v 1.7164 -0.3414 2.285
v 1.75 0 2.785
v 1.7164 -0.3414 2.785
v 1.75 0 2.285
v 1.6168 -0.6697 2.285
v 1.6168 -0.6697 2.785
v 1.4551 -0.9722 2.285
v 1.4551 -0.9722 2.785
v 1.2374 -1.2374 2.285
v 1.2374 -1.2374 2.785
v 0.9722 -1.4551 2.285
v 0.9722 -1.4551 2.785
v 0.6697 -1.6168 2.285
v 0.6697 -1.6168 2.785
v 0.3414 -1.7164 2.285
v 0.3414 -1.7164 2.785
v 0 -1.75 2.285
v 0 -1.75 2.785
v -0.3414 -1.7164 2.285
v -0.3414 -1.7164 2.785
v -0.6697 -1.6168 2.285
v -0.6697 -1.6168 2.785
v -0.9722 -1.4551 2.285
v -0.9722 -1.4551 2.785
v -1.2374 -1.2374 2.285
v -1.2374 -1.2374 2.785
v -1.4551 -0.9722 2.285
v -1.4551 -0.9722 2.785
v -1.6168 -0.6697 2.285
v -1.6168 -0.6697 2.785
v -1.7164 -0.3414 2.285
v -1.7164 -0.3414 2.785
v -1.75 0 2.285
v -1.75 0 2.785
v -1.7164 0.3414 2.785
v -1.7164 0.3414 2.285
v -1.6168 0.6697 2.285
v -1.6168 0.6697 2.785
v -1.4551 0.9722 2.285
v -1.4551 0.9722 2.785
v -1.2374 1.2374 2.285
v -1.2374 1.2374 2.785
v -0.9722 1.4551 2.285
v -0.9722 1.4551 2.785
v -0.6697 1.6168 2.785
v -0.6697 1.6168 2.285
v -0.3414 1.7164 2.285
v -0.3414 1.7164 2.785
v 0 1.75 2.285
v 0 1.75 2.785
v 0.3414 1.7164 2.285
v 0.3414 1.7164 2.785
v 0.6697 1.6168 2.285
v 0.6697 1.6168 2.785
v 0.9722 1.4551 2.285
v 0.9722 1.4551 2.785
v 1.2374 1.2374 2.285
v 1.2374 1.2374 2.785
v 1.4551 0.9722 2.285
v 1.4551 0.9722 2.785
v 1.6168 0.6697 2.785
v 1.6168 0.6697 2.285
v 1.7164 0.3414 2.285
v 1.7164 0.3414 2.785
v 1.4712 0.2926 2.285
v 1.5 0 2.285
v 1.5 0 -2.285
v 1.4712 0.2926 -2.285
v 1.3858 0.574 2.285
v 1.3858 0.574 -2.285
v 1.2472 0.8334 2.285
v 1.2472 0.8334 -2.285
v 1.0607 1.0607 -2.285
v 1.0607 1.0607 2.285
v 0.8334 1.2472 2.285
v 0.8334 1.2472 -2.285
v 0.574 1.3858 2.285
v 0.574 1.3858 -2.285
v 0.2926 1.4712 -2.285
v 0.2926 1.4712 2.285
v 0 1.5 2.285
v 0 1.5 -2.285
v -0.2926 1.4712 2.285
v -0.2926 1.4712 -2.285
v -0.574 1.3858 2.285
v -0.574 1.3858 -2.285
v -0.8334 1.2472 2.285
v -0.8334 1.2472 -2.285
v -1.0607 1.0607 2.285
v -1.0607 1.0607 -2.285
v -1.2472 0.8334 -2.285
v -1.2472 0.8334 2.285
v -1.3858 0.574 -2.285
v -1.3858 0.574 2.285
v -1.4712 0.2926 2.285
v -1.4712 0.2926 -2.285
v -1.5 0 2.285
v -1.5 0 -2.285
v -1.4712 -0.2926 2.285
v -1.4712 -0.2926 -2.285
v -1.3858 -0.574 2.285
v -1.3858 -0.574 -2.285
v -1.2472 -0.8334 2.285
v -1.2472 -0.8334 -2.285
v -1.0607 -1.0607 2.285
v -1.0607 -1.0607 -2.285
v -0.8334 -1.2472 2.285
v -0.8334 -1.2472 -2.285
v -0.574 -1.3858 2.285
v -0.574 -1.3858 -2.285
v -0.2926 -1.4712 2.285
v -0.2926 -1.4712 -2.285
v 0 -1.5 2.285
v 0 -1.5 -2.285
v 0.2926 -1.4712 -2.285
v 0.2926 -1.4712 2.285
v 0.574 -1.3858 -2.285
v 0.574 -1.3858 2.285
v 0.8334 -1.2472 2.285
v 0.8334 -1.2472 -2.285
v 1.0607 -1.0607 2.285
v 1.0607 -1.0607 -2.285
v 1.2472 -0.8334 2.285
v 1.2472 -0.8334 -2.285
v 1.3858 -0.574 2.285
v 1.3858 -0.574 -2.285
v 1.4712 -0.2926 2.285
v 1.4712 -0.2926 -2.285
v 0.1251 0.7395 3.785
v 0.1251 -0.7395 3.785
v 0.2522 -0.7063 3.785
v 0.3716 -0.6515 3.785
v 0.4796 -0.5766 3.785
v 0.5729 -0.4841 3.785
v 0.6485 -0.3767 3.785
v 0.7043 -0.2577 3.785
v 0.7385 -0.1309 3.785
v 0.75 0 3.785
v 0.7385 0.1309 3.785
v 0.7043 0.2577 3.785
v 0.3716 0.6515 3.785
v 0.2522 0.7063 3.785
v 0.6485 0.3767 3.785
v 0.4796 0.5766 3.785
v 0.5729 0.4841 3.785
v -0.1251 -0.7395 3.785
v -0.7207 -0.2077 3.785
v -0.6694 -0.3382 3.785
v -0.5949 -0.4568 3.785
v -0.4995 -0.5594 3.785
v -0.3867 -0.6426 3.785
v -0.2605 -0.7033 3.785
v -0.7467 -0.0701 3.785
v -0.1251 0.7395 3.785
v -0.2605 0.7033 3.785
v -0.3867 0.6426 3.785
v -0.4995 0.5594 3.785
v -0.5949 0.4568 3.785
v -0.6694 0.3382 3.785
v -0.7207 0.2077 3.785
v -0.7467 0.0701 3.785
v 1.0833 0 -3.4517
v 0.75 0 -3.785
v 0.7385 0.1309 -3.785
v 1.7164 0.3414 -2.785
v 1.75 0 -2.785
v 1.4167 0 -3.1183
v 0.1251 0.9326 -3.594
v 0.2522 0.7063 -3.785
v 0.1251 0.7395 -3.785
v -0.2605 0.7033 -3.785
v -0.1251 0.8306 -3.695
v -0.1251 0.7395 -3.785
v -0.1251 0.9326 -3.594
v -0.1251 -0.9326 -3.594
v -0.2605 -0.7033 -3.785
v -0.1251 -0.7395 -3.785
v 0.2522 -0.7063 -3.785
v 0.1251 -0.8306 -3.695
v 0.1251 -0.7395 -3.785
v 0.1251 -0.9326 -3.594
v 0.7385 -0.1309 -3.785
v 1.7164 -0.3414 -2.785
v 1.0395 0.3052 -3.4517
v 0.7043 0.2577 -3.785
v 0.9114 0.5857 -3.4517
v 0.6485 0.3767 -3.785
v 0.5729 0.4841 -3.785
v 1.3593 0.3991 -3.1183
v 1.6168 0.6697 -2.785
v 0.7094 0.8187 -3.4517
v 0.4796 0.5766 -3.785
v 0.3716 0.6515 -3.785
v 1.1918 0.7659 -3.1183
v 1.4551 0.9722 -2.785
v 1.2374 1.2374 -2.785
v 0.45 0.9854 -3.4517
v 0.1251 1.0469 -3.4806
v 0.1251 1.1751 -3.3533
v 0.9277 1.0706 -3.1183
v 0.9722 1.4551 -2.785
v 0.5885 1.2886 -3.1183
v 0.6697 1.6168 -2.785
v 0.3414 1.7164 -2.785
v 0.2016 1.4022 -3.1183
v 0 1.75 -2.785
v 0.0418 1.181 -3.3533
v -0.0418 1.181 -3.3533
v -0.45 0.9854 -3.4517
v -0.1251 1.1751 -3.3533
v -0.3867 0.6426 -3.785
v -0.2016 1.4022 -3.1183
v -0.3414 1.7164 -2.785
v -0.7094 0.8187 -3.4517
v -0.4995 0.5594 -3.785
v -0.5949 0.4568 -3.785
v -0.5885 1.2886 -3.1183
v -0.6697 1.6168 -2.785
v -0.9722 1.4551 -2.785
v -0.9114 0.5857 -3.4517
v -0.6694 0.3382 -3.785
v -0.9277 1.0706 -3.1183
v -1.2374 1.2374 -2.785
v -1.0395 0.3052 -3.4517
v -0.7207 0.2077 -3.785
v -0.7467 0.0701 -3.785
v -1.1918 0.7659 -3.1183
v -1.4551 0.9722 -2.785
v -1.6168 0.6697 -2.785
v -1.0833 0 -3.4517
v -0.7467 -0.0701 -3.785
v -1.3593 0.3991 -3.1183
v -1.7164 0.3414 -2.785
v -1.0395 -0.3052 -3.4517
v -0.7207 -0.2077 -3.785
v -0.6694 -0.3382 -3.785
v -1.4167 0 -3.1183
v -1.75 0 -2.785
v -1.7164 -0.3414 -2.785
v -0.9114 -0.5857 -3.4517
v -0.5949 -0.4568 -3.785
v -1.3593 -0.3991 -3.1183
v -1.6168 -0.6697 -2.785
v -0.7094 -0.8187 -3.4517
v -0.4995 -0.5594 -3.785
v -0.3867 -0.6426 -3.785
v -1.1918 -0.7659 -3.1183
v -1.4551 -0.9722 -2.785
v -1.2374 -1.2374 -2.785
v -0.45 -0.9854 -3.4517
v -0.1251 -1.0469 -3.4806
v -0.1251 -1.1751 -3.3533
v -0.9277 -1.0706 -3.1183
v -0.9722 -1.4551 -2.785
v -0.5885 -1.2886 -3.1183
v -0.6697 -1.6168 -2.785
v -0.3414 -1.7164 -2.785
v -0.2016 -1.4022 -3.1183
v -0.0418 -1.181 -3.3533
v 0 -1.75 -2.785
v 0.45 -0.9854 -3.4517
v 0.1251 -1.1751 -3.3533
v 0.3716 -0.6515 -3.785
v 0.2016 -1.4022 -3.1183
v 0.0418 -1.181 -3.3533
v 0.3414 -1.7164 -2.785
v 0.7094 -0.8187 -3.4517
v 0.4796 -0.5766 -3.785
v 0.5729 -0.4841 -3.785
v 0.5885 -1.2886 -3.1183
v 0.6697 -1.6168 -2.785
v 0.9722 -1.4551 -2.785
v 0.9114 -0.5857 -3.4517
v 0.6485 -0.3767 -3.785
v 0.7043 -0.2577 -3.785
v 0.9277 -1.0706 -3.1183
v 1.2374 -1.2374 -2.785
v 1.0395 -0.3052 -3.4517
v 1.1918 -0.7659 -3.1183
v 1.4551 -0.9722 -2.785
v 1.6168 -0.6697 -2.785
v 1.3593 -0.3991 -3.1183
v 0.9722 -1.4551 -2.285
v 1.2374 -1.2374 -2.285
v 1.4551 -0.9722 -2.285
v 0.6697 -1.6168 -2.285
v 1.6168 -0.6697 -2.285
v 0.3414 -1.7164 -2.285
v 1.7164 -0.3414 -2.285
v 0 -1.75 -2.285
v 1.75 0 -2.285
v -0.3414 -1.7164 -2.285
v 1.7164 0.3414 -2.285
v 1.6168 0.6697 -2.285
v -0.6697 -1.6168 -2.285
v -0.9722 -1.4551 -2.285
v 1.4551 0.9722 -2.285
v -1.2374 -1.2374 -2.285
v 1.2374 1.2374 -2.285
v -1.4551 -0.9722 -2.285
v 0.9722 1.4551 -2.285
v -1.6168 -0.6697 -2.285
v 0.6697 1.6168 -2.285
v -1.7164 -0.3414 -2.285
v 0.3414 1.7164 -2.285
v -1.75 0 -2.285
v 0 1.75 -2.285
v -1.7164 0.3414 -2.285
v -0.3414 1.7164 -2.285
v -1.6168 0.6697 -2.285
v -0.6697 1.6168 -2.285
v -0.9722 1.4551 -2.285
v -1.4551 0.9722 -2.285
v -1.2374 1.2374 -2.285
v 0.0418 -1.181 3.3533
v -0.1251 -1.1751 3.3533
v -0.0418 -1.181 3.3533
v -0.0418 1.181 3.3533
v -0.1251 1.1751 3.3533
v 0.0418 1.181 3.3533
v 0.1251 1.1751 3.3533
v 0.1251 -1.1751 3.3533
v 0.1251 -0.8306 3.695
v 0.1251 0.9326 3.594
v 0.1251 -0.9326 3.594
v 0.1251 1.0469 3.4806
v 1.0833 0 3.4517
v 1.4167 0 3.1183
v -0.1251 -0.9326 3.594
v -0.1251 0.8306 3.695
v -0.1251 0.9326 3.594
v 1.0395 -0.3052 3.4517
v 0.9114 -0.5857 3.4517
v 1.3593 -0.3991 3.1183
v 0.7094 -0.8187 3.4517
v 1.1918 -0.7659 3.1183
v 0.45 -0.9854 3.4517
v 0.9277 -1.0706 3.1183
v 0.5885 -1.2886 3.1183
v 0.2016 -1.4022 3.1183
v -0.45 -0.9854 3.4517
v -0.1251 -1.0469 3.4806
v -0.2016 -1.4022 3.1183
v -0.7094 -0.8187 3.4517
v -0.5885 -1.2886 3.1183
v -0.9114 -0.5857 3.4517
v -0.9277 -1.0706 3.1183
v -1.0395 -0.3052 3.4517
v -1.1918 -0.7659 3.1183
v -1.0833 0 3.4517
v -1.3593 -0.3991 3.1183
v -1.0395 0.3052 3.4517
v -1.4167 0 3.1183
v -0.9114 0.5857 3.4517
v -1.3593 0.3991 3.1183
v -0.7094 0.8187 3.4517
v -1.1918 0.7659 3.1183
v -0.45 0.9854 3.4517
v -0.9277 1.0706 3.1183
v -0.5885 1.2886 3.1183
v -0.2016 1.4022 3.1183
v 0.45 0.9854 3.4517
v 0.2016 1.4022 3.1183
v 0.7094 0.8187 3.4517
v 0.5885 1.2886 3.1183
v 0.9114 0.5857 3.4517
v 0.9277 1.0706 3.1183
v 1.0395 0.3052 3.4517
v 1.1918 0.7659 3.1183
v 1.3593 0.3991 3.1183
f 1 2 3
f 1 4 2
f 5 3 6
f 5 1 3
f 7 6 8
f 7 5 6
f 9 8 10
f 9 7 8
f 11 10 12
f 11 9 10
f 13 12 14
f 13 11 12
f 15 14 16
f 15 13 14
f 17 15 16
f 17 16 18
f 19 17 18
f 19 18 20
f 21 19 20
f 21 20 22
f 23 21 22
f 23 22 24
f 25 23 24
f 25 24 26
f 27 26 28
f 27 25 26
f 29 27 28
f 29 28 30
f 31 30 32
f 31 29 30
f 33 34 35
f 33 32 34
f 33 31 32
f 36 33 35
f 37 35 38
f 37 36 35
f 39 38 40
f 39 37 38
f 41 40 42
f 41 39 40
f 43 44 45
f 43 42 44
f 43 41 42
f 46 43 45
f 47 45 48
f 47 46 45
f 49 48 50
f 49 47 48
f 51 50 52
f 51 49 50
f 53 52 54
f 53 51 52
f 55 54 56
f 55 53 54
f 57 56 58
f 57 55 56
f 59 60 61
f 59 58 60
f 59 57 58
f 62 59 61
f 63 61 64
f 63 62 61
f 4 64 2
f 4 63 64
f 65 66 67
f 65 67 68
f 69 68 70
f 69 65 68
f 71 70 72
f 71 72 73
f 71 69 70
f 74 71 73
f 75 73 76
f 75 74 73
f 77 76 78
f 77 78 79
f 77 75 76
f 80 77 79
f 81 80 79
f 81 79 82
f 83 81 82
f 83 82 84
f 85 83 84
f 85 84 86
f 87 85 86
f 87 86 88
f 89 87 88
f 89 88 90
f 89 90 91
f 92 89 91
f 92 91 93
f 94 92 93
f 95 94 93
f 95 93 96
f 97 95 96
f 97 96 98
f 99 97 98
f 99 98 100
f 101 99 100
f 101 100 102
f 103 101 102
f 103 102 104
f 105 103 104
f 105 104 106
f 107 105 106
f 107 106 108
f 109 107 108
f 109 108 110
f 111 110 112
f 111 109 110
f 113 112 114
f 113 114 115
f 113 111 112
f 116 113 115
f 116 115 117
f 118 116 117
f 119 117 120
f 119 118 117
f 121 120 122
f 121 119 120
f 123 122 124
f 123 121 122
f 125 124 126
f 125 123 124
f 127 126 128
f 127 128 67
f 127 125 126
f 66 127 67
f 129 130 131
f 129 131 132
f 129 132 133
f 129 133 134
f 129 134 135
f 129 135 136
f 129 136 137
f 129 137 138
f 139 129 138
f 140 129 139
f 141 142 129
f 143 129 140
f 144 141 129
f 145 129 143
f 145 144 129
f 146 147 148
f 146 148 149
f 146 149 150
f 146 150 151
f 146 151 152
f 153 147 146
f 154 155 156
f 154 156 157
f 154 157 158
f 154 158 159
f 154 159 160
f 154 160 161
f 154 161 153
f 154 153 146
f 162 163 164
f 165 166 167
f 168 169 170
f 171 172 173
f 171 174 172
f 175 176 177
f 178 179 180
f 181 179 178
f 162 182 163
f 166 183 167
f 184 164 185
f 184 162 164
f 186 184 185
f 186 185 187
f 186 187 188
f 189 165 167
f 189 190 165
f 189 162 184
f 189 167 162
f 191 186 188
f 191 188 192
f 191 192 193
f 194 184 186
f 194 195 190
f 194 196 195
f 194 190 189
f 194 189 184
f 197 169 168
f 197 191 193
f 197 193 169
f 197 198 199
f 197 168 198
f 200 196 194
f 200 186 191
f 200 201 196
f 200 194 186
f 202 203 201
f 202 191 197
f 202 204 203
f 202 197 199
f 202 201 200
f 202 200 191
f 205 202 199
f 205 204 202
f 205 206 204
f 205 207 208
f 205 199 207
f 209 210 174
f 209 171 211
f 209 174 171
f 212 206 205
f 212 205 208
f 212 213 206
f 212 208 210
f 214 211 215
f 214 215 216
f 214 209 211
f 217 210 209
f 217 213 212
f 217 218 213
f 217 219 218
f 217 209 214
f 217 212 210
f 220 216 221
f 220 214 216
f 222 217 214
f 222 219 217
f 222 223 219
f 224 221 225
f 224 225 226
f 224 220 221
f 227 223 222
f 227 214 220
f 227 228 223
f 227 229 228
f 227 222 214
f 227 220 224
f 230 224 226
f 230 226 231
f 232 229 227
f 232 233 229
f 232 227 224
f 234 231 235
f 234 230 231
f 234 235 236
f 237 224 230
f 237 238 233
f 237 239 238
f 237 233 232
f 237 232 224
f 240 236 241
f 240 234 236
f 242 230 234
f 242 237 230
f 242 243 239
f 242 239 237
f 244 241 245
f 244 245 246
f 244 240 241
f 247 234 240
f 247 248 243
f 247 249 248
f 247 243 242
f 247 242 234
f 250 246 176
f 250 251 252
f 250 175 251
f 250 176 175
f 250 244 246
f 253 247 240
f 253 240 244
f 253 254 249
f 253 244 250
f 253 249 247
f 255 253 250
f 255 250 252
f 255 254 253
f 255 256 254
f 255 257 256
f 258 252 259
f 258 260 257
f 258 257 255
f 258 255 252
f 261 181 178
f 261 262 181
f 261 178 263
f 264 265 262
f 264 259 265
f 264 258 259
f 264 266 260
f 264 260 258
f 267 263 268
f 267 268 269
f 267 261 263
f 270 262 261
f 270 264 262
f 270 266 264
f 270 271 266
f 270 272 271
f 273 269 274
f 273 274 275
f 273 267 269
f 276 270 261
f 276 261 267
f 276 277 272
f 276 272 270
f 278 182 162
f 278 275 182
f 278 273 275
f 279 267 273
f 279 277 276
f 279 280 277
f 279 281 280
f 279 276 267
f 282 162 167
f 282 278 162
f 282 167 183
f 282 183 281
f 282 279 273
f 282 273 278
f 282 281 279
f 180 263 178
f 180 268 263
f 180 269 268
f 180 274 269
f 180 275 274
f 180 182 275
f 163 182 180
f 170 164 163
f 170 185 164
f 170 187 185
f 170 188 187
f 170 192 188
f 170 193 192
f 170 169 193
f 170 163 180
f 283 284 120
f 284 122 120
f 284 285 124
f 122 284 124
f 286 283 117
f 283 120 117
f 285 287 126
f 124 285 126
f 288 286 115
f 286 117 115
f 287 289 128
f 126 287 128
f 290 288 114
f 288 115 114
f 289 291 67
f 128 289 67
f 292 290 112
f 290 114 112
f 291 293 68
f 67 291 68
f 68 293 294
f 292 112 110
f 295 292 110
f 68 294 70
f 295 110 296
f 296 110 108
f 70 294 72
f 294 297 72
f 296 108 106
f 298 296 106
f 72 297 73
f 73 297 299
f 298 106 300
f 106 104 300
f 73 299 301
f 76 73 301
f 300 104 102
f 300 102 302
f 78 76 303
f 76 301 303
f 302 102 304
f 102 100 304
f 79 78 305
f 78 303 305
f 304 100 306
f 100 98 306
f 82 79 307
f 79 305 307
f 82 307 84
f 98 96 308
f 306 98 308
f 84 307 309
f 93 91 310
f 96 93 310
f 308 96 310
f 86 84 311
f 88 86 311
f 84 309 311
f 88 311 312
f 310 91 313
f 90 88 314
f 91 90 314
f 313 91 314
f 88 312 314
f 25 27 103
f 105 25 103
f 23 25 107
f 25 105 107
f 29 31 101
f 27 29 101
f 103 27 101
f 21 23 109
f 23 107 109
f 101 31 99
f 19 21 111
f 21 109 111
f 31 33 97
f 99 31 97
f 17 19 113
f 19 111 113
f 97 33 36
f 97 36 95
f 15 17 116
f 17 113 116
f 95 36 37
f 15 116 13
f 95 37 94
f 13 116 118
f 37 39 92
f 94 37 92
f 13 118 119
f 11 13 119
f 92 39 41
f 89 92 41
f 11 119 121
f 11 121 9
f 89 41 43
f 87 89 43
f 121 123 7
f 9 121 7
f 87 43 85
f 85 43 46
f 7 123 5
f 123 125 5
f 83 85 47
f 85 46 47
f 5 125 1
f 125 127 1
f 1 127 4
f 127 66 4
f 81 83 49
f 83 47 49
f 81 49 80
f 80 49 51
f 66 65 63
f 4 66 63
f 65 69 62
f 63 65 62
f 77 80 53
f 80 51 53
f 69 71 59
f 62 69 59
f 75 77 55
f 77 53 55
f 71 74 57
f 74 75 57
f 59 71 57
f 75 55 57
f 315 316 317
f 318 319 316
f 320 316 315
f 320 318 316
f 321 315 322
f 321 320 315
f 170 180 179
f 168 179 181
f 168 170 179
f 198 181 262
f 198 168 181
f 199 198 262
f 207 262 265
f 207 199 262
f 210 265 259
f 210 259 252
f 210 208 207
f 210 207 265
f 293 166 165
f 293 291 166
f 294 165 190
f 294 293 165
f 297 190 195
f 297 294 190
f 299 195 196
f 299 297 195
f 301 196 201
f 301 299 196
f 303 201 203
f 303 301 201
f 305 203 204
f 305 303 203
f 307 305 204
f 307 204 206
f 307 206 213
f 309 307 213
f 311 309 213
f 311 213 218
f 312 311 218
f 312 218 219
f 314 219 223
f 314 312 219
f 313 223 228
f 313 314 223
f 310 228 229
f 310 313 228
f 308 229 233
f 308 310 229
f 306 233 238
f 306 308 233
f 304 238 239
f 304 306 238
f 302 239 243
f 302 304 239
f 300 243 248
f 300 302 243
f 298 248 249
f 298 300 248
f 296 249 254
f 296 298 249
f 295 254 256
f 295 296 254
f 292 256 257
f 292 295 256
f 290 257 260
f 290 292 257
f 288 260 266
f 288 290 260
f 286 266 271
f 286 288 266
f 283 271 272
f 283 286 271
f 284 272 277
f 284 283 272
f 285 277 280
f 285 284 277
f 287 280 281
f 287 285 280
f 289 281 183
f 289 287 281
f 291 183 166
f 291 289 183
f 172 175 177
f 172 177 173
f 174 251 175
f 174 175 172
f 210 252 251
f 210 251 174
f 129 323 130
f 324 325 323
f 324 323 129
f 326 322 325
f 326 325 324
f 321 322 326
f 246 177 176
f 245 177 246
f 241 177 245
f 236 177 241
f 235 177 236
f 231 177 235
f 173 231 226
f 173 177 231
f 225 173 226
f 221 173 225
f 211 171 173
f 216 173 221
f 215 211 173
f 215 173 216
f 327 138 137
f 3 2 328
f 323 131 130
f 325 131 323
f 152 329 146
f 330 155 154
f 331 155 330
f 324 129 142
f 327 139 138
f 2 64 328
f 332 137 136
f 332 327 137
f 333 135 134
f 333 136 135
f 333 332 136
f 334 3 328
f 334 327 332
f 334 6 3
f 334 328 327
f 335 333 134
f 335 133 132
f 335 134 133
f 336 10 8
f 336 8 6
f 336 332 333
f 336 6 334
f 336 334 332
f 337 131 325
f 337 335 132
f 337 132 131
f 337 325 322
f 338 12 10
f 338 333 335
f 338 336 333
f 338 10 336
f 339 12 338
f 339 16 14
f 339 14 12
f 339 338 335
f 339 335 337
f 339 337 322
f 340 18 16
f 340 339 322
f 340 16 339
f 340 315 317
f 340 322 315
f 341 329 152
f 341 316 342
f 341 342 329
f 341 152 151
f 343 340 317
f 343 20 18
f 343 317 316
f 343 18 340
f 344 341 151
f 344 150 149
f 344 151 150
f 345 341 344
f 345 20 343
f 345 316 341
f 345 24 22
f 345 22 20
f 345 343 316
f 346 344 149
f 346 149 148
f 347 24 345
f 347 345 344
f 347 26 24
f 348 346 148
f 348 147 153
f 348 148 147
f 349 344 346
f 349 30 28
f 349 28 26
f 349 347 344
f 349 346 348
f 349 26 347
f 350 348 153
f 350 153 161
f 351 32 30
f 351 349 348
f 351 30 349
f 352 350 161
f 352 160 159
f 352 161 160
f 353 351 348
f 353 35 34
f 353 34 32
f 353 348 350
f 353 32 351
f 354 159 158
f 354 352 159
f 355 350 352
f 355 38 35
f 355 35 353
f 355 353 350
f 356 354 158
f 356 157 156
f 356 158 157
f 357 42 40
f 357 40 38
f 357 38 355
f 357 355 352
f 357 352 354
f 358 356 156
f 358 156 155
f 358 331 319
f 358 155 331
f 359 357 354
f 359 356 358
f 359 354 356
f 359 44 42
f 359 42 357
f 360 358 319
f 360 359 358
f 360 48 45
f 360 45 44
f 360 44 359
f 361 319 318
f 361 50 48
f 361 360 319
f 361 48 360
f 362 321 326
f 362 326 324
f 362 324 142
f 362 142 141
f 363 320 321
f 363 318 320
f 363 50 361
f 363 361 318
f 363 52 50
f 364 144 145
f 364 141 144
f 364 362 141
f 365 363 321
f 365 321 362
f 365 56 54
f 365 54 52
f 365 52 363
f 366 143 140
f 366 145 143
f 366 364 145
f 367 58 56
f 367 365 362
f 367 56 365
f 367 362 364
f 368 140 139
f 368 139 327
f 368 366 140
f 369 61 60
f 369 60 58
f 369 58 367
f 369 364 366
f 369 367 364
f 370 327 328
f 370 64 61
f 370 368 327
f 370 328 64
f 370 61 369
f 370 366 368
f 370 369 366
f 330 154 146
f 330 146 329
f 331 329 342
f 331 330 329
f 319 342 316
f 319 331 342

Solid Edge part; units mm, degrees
sketch "Sketch1" plane through (0, 0, 0) normal (0, 0, 1) x (1, 0, 0)
  circle A0 centre (0, 0) radius 1.5
extrude "Ajout_matière_1" add sketch "Sketch1" along normal mid plane 4.57
sketch "Sketch2" plane through (0, 0, 2.285) normal (0, 0, 1) x (1, 0, 0)
  circle A0 centre (0, 0) radius 1.75
  dimension "D1" = 3.5
extrude "Ajout_matière_2" add sketch "Sketch2" along normal blind 1.5
chamfer "Chanfrein_1" distance 1 angle 45 1 edges at (-1.75, 0, 3.785)
mirror "Mirror1" about plane through (0, 0, 0) normal (0, 0, 1) of "Ajout_matière_2"
chamfer "Chamfer1" distance 1 angle 45 1 edges at (-1.75, 0, -3.785)
sketch "Sketch3" plane through (0, 0, 0) normal (0, -1, 0) x (1, 0, 0)
  line L0 (-0.1251, 3.3533) -> (0.1251, 3.3533)
  line L1 (0.1251, 3.3533) -> (0.1251, 4.2167)
  line L2 (0.1251, 4.2167) -> (-0.1251, 4.2167)
  line L3 (-0.1251, 4.2167) -> (-0.1251, 3.3533)
extrude "Enlèvement_matière_1" cut sketch "Sketch3" along normal mid plane 157.2986
mirror "Mirror2" about plane through (0, 0, 0) normal (0, 0, 1) of "Enlèvement_matière_1"
properties material "Acrylique, haute performance"
